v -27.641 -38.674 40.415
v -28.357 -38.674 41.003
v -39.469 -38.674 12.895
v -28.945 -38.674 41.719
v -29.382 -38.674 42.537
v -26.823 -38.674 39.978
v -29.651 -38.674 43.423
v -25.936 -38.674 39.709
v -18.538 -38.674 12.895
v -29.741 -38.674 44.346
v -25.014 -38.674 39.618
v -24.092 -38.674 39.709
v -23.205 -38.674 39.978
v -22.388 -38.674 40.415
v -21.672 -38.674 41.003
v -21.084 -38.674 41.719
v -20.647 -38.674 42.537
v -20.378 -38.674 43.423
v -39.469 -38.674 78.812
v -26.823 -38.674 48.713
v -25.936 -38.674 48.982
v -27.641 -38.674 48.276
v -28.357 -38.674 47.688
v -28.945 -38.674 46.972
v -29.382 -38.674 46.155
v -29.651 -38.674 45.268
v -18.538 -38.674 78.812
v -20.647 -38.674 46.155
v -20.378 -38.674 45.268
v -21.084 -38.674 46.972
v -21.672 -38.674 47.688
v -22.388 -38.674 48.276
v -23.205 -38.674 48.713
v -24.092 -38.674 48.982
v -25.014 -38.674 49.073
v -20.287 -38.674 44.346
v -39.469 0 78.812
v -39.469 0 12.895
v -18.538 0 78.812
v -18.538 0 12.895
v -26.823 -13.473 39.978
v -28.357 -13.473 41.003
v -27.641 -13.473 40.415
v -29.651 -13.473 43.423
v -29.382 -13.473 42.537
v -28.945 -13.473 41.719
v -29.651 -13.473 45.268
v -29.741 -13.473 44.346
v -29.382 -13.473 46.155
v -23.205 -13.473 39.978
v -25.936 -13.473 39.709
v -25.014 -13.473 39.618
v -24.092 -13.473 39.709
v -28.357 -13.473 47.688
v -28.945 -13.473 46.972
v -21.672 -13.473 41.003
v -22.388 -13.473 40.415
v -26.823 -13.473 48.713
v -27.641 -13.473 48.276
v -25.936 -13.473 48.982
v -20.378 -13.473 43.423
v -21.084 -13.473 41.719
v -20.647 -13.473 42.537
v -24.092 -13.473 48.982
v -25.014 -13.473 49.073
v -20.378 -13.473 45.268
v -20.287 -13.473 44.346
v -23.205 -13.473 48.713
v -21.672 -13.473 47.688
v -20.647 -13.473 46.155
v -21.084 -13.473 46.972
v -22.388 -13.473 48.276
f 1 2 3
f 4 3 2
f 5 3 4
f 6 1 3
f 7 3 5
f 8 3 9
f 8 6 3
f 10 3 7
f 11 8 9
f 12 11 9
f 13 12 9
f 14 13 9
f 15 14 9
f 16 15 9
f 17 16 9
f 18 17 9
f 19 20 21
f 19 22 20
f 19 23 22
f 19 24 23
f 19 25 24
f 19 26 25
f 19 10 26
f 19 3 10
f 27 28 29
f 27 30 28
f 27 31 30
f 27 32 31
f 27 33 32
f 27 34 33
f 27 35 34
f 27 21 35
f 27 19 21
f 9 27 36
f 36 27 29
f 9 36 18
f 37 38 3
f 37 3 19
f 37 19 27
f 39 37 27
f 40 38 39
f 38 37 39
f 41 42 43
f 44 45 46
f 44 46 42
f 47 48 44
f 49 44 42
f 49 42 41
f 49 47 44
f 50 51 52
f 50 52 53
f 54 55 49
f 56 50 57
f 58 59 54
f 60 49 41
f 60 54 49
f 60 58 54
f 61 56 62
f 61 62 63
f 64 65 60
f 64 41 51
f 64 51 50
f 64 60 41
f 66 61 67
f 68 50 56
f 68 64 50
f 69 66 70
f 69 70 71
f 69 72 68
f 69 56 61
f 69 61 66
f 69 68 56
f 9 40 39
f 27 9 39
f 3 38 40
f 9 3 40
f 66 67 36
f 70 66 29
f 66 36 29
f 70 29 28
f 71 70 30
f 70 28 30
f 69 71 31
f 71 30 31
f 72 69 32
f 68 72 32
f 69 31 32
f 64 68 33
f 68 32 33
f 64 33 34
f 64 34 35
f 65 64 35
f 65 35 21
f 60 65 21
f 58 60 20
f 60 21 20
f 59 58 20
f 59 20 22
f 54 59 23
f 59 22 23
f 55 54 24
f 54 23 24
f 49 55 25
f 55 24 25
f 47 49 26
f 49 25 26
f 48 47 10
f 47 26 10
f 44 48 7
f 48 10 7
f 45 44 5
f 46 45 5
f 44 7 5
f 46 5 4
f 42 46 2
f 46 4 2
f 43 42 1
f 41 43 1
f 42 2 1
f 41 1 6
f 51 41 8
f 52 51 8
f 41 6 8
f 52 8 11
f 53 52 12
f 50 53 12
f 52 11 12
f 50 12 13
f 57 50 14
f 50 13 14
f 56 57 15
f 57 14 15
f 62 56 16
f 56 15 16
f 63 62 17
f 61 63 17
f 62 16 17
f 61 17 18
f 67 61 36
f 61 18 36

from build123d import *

# Parameters (mm, degrees)
F0_W      = 20.930506
F0_H      = 12.882103
F1_DEPTH  = 38.67383
F1_FACE_W = 20.930506
F1_FACE_H = 38.67383
F2_DEPTH  = 53.03582
F3_R      = 4.727267
F4_DEPTH  = 25.20039


with BuildPart() as f1:
    # F0 (on Front) → F1 (new body)
    with BuildSketch(Plane.XZ):
        with Locations((-29.003717, 19.335555)):
            Rectangle(F0_W, F0_H)
    extrude(amount=F1_DEPTH)

    # F1_face (on face) → F2 (join)
    with BuildSketch(Plane(origin=(-29.003717, -19.336915, 25.776606), x_dir=(1, 0, 0), z_dir=(0, 0, 1))):
        Rectangle(F1_FACE_W, F1_FACE_H)
    extrude(amount=F2_DEPTH)

    # F3 (on face) → F4 (cut)
    with BuildSketch(Plane.XZ.offset(38.67383)):
        with Locations((-25.014196, 44.345655)):
            Circle(F3_R)
    extrude(amount=-F4_DEPTH, mode=Mode.SUBTRACT)


solid = f1.part
